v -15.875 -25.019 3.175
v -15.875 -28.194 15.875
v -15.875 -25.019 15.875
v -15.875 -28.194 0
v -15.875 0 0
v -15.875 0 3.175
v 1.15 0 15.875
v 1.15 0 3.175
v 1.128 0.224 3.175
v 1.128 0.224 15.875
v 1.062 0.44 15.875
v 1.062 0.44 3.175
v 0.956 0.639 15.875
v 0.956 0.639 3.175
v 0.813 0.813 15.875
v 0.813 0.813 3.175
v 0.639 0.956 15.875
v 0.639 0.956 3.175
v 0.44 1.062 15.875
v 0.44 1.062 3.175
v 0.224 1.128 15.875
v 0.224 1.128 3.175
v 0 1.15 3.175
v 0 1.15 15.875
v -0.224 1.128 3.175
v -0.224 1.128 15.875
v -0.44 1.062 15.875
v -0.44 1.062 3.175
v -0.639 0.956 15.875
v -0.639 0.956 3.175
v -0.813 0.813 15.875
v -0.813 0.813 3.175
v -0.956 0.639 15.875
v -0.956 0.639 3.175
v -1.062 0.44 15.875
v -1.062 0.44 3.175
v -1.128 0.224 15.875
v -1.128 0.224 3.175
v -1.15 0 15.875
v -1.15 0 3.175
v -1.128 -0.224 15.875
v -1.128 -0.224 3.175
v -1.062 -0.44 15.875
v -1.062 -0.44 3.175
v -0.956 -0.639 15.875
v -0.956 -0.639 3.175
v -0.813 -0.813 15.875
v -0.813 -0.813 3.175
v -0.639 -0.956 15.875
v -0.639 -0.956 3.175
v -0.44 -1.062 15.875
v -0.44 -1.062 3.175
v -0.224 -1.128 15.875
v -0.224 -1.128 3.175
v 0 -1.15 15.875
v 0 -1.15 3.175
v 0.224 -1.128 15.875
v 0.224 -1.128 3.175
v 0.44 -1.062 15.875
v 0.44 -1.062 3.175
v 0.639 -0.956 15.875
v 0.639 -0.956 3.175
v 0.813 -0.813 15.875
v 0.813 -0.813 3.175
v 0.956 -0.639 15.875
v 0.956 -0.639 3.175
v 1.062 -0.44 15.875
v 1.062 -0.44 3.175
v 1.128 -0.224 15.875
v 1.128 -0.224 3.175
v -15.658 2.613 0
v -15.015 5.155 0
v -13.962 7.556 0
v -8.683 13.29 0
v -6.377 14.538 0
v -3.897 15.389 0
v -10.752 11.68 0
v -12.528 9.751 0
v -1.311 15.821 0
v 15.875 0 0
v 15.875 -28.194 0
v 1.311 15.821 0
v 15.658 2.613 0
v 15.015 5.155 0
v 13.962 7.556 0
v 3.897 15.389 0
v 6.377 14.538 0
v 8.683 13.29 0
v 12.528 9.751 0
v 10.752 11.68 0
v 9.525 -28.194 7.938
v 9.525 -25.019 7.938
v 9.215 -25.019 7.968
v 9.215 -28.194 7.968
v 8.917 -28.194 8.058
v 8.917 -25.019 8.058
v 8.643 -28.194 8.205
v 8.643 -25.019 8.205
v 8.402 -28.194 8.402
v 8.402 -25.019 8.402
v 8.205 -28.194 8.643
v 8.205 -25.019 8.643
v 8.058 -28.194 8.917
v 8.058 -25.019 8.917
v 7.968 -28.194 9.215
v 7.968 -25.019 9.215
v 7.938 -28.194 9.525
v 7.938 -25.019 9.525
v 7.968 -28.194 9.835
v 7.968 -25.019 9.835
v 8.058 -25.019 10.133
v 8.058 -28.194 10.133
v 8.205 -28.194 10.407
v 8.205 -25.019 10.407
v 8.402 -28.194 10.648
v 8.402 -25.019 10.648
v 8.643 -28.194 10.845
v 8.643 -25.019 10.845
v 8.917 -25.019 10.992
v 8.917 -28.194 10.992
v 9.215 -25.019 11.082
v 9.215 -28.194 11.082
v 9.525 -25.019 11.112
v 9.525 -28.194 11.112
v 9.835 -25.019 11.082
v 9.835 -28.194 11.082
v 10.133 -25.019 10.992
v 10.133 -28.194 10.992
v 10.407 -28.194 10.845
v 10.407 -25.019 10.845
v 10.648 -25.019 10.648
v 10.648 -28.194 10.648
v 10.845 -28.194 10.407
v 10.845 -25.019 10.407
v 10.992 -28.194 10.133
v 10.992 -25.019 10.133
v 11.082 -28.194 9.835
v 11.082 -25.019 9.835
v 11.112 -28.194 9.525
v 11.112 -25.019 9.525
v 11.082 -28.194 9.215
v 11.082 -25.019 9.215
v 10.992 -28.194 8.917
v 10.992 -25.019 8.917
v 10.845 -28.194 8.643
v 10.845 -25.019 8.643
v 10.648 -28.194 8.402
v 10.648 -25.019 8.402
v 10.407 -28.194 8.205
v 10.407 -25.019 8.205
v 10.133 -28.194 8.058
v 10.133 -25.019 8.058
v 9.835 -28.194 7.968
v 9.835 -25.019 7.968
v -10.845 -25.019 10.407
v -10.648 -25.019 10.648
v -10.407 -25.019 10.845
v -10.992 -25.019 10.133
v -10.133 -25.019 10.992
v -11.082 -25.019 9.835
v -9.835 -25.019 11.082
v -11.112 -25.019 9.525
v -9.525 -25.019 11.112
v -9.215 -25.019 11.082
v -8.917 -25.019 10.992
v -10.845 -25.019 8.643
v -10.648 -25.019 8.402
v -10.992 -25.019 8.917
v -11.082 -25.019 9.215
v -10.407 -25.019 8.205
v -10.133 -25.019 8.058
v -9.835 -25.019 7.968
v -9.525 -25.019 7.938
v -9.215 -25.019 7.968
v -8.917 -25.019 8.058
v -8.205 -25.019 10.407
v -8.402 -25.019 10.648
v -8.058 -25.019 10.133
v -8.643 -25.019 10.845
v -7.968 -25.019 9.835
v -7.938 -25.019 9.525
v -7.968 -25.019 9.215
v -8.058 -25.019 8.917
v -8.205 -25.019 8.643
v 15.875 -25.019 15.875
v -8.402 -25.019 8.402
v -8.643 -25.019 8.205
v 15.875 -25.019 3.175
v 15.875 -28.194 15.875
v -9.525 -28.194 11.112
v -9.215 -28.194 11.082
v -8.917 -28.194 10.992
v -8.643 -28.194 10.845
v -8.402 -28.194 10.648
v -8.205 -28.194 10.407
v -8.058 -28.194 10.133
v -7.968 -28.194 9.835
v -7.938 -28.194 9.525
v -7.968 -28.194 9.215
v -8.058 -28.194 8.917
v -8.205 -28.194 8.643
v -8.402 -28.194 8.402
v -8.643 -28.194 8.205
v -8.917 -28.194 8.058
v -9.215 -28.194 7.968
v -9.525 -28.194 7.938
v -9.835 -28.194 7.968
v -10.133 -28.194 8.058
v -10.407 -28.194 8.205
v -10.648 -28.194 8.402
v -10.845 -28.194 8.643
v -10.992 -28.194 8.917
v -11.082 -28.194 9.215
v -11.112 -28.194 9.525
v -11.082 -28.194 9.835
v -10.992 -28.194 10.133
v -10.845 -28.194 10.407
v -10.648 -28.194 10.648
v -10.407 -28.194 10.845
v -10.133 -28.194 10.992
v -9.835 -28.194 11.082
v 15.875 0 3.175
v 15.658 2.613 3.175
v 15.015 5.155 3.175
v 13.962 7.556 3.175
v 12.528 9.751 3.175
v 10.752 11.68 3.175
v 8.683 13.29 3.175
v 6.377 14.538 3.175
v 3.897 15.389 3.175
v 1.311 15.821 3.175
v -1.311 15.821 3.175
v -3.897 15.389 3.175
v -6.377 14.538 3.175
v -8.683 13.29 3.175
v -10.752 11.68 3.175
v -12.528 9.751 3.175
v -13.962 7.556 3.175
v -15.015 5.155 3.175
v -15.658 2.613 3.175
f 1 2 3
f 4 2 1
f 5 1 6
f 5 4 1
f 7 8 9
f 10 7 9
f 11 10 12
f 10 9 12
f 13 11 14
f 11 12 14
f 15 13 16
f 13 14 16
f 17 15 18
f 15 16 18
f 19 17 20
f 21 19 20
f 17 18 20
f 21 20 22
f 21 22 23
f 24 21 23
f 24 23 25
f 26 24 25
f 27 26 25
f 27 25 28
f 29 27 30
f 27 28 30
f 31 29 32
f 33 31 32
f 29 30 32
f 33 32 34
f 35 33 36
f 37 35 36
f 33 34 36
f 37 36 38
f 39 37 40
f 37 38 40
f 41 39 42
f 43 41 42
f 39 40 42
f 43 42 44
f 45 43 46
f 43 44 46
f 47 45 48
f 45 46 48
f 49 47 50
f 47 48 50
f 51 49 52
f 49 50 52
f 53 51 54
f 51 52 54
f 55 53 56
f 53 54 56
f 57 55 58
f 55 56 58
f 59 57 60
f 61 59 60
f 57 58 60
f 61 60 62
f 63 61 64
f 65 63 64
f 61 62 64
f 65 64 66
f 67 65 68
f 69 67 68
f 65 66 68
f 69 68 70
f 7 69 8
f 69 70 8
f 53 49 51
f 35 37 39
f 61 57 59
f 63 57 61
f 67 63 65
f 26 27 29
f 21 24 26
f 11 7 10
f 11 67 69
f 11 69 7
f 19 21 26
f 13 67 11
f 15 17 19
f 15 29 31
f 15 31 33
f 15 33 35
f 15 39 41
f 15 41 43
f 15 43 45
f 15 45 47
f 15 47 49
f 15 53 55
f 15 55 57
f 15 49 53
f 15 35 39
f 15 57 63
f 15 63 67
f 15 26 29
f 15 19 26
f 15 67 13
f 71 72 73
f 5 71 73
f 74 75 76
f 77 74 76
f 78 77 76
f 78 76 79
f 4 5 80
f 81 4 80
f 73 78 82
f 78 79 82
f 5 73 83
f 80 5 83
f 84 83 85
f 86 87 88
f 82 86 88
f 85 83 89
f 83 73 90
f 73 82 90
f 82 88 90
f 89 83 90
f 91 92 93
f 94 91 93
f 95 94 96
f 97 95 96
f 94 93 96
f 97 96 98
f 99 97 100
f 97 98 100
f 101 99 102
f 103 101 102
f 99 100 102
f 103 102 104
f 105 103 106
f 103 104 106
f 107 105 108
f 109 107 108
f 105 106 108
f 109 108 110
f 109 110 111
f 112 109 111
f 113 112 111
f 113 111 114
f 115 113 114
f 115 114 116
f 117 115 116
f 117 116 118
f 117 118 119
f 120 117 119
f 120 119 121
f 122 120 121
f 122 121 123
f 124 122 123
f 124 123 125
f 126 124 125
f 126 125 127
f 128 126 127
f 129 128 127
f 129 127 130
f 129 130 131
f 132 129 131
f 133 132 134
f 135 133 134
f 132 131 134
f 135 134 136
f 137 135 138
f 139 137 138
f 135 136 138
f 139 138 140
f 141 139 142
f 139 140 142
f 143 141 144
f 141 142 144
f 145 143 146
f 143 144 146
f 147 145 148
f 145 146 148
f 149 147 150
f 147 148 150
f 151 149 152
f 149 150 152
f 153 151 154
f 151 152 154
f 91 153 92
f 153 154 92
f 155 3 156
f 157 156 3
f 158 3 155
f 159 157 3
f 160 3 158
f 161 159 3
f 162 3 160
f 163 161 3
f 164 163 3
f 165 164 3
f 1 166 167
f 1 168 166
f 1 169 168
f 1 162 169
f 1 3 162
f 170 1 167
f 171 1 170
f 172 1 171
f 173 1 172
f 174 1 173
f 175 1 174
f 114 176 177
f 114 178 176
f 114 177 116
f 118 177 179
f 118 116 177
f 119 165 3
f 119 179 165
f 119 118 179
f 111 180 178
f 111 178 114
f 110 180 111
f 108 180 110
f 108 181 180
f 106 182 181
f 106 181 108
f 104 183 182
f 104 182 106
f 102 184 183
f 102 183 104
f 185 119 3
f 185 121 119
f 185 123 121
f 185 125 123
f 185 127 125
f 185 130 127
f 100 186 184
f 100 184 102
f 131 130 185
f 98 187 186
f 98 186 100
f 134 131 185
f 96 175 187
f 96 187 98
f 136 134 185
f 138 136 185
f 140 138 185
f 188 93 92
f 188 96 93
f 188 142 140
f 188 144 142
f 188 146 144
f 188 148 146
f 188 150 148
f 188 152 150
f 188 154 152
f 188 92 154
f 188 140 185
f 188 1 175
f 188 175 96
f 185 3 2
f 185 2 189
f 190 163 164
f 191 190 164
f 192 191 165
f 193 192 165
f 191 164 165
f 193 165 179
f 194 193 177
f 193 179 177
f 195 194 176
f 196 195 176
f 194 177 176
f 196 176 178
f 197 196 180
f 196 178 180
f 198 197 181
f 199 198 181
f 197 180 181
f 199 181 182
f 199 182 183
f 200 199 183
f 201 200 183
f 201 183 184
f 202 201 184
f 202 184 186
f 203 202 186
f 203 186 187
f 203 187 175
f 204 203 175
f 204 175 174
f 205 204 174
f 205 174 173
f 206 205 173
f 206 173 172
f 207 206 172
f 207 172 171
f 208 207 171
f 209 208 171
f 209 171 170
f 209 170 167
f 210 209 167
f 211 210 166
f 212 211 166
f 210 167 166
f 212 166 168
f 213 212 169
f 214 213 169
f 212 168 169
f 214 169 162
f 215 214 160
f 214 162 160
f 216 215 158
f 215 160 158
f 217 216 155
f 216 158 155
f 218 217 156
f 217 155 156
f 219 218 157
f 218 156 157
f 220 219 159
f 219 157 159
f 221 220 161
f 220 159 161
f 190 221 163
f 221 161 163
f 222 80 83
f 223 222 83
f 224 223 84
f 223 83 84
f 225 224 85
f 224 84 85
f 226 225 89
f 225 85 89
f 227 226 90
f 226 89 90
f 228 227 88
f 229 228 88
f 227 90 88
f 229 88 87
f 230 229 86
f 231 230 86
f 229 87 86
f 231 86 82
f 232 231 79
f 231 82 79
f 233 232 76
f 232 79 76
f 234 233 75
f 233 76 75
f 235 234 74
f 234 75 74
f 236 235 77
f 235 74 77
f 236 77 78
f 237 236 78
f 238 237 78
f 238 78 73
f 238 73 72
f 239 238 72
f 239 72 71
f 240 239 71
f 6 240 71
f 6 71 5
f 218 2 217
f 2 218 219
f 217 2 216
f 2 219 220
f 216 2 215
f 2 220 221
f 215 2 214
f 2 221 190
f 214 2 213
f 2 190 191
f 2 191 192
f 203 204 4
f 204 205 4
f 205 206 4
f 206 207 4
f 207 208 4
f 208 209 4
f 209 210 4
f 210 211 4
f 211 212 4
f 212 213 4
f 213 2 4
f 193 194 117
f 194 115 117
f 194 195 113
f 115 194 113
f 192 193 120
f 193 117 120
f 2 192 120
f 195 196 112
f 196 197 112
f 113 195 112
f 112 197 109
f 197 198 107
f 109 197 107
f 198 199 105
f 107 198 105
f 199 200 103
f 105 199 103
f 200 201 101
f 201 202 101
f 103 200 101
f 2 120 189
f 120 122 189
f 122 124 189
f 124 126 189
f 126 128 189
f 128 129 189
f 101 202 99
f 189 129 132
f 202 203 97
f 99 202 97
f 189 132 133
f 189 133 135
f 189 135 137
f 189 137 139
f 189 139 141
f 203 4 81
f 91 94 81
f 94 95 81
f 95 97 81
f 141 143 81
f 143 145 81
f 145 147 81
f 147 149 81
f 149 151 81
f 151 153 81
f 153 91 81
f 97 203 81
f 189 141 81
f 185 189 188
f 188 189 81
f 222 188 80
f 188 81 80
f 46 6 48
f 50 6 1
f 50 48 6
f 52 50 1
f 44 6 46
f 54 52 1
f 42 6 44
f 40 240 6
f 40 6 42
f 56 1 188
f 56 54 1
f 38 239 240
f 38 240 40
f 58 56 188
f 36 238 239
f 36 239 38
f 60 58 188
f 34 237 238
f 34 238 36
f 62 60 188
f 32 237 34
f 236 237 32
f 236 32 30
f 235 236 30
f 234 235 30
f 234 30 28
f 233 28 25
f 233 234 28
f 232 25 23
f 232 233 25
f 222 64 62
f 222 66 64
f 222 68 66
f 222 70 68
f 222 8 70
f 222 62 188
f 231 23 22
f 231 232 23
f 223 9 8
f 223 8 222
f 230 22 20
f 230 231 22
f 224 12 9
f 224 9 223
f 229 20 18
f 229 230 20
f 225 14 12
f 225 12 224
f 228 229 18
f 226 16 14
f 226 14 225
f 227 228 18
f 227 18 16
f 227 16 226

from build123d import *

# Parameters (mm, degrees)
BOSS_EXTRUDE1_DEPTH = 3.175
SKETCH4_W           = 31.75
SKETCH4_H           = 3.175
BOSS_EXTRUDE2_DEPTH = 12.7
SKETCH5_R           = 1.5875
CUT_EXTRUDE2_DEPTH  = 47.651371748
SKETCH6_R           = 1.15
BOSS_EXTRUDE3_DEPTH = 12.7


with BuildPart() as part:
    # Sketch1 → Boss-Extrude1 (new body)
    with BuildSketch(Plane.XY):
        with BuildLine():
            ThreePointArc((15.875, 0), (0, 15.875), (-15.875, 0))
            Line((-15.875, 0), (15.875, 0))
        make_face()
        with BuildLine():
            ThreePointArc((15.875, 0), (0, -15.875), (-15.875, 0))
            Line((-15.875, 0), (-15.875, -28.194))
            Line((-15.875, -28.194), (15.875, -28.194))
            Line((15.875, -28.194), (15.875, 0))
        make_face()
        with BuildLine():
            Line((15.875, 0), (-15.875, 0))
            ThreePointArc((-15.875, 0), (0, -15.875), (15.875, 0))
        make_face()
    extrude(amount=BOSS_EXTRUDE1_DEPTH)

    # Sketch4 → Boss-Extrude2 (add)
    with BuildSketch(Plane.XY.offset(3.175)):
        with Locations((0, -26.6065)):
            Rectangle(SKETCH4_W, SKETCH4_H)
    extrude(amount=BOSS_EXTRUDE2_DEPTH)

    # Sketch5 → Cut-Extrude2 (cut, through all)
    with BuildSketch(Plane(origin=(0, -25.019, 0), x_dir=(1, 0, 0), z_dir=(0, 1, 0))):
        with Locations(Location((-9.525, -9.525, 0), (0, 0, 270))):
            Circle(SKETCH5_R)
        with Locations(Location((9.525, -9.525, 0), (0, 0, 90))):
            Circle(SKETCH5_R)
    extrude(amount=-CUT_EXTRUDE2_DEPTH, mode=Mode.SUBTRACT)

    # Sketch6 → Boss-Extrude3 (add, through all)
    with BuildSketch(Plane.XY.offset(3.175)):
        Circle(SKETCH6_R)
    extrude(amount=BOSS_EXTRUDE3_DEPTH)


solid = part.part
